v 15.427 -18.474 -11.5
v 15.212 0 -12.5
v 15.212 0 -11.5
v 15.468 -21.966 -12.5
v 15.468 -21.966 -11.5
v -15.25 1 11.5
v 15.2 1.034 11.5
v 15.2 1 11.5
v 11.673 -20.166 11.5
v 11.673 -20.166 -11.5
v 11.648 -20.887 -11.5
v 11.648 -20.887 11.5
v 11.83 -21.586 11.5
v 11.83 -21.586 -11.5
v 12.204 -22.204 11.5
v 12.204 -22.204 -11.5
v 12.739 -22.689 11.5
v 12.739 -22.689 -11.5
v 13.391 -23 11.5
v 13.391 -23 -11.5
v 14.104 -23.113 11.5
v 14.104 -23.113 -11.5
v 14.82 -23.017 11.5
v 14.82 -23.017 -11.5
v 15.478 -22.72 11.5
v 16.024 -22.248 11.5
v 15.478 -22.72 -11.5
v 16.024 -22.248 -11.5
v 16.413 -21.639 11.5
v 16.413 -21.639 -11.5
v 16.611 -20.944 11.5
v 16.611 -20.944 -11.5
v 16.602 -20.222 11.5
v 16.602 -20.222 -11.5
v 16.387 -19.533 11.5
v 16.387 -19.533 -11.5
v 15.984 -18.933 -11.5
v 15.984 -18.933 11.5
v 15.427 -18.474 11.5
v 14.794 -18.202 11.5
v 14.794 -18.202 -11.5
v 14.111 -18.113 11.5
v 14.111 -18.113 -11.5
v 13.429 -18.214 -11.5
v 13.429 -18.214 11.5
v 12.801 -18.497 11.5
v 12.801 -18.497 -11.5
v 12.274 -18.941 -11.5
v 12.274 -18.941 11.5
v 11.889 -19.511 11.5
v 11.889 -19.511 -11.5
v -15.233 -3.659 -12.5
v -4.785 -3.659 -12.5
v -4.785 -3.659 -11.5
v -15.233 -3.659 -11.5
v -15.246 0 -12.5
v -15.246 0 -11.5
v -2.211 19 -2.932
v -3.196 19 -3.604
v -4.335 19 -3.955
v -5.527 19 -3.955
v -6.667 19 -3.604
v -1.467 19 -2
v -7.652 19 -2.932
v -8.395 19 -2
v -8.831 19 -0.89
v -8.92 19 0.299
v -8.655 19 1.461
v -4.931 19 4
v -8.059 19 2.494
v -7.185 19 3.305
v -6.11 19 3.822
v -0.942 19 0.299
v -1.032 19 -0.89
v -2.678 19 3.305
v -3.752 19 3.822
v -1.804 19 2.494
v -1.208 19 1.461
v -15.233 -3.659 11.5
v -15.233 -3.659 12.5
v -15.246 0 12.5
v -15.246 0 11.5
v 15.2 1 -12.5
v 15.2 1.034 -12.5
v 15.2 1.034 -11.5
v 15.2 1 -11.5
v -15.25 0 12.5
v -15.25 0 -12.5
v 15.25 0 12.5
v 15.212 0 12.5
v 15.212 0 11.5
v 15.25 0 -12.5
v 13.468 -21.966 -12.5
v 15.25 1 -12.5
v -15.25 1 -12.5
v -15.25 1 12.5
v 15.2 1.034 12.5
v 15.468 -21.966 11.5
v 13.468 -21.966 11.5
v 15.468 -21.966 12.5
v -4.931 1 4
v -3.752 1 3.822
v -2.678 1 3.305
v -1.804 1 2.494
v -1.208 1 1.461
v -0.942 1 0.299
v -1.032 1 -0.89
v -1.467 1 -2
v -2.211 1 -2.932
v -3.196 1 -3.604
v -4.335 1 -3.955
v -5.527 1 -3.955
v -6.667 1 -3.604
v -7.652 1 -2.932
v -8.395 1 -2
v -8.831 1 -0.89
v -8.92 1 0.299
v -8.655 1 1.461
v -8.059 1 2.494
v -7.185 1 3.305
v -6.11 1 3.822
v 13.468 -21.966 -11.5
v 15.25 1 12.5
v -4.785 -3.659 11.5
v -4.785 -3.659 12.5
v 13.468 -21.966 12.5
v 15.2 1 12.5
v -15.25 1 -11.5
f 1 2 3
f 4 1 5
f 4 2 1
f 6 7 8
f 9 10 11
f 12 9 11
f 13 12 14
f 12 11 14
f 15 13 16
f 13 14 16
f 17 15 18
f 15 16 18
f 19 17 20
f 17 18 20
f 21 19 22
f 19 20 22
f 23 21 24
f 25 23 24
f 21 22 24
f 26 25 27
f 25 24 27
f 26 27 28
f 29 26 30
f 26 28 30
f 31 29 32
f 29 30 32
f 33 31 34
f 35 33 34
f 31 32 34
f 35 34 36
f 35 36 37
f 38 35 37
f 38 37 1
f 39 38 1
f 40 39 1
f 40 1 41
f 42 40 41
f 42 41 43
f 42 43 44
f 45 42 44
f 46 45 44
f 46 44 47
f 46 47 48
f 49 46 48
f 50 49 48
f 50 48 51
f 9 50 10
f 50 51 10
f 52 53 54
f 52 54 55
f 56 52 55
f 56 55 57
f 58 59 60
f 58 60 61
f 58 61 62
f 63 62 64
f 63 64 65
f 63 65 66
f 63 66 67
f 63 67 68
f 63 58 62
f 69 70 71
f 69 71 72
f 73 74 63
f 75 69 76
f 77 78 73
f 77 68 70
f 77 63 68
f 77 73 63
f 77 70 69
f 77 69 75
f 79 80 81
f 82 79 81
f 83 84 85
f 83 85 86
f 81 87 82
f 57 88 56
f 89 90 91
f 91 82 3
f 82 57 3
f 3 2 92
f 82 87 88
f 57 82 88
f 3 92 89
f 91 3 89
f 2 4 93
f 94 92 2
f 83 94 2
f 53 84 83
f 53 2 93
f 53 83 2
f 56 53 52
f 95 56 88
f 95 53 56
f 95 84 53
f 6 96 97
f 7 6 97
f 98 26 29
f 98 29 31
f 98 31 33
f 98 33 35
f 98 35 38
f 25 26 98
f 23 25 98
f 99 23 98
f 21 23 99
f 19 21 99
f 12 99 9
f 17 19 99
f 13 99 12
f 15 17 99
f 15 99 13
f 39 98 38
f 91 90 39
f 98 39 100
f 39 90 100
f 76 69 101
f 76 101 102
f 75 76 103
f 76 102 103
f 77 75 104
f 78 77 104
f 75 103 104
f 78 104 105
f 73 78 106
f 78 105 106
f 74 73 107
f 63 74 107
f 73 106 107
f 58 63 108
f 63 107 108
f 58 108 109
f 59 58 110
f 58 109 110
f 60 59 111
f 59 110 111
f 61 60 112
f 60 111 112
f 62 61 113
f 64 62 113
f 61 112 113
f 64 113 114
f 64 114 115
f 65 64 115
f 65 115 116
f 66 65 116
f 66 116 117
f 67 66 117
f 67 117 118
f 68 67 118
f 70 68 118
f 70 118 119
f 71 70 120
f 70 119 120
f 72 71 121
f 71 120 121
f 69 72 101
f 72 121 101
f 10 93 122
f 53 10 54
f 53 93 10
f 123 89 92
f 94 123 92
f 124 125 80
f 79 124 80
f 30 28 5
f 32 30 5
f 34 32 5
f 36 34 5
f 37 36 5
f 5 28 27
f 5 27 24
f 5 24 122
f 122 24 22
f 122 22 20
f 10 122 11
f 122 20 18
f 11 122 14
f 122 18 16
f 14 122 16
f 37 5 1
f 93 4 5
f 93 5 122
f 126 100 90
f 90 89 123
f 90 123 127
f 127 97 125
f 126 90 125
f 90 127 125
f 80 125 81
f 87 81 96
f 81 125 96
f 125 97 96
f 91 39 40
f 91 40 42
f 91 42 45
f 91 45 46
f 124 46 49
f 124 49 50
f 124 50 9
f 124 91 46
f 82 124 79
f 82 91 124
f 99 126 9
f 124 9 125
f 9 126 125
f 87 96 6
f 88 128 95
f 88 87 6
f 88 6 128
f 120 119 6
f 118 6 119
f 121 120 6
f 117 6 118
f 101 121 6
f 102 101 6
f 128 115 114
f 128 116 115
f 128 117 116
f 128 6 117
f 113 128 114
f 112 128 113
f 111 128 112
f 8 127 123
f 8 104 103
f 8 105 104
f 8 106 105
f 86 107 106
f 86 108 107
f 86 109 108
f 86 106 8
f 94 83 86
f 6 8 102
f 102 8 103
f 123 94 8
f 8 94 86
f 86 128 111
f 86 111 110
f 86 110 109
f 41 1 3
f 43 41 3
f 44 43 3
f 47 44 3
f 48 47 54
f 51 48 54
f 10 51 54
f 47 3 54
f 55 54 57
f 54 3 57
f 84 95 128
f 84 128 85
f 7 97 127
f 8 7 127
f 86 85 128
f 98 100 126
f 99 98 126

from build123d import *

# Parameters (mm, degrees)
ESQUISSE1_W        = 30.5
ESQUISSE1_H        = 25
BOSS_EXTRU_1_DEPTH = 1
BOSS_EXTRU_2_DEPTH = 1
ESQUISSE3_R        = 2.5
BOSS_EXTRU_3_DEPTH = 23
ESQUISSE4_R        = 4
BOSS_EXTRU_4_DEPTH = 18


with BuildPart() as part:
    # Esquisse1 → Boss.-Extru.1 (new body)
    with BuildSketch(Plane(origin=(0, 0, 0), x_dir=(1, 0, 0), z_dir=(0, 1, 0))):
        Rectangle(ESQUISSE1_W, ESQUISSE1_H)
    extrude(amount=BOSS_EXTRU_1_DEPTH)

    # Esquisse2 → Boss.-Extru.2 (add)
    with BuildSketch(Plane.XY.offset(12.5)):
        Polygon((15.199854564, 1.034402705), (15.467639278, -21.965597295), (13.467639278, -21.965597295), (-4.785365363, -3.659095072), (-15.23307626, -3.659095072), (-15.25, 1), align=None)
    boss_extru_2 = extrude(amount=-BOSS_EXTRU_2_DEPTH)

    # Symétrie1: Boss.-Extru.2 across plane
    add(boss_extru_2.mirror(Plane.XY))

    # Esquisse3 → Boss.-Extru.3 (add)
    with BuildSketch(Plane.XY.offset(-11.5)):
        with Locations(Location((14.132711903, -20.613073056, 0), (0, 0, 169.692708603))):
            Circle(ESQUISSE3_R)
    extrude(amount=BOSS_EXTRU_3_DEPTH)

    # Esquisse4 → Boss.-Extru.4 (add)
    with BuildSketch(Plane(origin=(0, 1, 0), x_dir=(1, 0, 0), z_dir=(0, 1, 0))):
        with Locations(Location((-4.931252749, 0, 0), (0, 0, 270))):
            Circle(ESQUISSE4_R)
    extrude(amount=BOSS_EXTRU_4_DEPTH)


solid = part.part
